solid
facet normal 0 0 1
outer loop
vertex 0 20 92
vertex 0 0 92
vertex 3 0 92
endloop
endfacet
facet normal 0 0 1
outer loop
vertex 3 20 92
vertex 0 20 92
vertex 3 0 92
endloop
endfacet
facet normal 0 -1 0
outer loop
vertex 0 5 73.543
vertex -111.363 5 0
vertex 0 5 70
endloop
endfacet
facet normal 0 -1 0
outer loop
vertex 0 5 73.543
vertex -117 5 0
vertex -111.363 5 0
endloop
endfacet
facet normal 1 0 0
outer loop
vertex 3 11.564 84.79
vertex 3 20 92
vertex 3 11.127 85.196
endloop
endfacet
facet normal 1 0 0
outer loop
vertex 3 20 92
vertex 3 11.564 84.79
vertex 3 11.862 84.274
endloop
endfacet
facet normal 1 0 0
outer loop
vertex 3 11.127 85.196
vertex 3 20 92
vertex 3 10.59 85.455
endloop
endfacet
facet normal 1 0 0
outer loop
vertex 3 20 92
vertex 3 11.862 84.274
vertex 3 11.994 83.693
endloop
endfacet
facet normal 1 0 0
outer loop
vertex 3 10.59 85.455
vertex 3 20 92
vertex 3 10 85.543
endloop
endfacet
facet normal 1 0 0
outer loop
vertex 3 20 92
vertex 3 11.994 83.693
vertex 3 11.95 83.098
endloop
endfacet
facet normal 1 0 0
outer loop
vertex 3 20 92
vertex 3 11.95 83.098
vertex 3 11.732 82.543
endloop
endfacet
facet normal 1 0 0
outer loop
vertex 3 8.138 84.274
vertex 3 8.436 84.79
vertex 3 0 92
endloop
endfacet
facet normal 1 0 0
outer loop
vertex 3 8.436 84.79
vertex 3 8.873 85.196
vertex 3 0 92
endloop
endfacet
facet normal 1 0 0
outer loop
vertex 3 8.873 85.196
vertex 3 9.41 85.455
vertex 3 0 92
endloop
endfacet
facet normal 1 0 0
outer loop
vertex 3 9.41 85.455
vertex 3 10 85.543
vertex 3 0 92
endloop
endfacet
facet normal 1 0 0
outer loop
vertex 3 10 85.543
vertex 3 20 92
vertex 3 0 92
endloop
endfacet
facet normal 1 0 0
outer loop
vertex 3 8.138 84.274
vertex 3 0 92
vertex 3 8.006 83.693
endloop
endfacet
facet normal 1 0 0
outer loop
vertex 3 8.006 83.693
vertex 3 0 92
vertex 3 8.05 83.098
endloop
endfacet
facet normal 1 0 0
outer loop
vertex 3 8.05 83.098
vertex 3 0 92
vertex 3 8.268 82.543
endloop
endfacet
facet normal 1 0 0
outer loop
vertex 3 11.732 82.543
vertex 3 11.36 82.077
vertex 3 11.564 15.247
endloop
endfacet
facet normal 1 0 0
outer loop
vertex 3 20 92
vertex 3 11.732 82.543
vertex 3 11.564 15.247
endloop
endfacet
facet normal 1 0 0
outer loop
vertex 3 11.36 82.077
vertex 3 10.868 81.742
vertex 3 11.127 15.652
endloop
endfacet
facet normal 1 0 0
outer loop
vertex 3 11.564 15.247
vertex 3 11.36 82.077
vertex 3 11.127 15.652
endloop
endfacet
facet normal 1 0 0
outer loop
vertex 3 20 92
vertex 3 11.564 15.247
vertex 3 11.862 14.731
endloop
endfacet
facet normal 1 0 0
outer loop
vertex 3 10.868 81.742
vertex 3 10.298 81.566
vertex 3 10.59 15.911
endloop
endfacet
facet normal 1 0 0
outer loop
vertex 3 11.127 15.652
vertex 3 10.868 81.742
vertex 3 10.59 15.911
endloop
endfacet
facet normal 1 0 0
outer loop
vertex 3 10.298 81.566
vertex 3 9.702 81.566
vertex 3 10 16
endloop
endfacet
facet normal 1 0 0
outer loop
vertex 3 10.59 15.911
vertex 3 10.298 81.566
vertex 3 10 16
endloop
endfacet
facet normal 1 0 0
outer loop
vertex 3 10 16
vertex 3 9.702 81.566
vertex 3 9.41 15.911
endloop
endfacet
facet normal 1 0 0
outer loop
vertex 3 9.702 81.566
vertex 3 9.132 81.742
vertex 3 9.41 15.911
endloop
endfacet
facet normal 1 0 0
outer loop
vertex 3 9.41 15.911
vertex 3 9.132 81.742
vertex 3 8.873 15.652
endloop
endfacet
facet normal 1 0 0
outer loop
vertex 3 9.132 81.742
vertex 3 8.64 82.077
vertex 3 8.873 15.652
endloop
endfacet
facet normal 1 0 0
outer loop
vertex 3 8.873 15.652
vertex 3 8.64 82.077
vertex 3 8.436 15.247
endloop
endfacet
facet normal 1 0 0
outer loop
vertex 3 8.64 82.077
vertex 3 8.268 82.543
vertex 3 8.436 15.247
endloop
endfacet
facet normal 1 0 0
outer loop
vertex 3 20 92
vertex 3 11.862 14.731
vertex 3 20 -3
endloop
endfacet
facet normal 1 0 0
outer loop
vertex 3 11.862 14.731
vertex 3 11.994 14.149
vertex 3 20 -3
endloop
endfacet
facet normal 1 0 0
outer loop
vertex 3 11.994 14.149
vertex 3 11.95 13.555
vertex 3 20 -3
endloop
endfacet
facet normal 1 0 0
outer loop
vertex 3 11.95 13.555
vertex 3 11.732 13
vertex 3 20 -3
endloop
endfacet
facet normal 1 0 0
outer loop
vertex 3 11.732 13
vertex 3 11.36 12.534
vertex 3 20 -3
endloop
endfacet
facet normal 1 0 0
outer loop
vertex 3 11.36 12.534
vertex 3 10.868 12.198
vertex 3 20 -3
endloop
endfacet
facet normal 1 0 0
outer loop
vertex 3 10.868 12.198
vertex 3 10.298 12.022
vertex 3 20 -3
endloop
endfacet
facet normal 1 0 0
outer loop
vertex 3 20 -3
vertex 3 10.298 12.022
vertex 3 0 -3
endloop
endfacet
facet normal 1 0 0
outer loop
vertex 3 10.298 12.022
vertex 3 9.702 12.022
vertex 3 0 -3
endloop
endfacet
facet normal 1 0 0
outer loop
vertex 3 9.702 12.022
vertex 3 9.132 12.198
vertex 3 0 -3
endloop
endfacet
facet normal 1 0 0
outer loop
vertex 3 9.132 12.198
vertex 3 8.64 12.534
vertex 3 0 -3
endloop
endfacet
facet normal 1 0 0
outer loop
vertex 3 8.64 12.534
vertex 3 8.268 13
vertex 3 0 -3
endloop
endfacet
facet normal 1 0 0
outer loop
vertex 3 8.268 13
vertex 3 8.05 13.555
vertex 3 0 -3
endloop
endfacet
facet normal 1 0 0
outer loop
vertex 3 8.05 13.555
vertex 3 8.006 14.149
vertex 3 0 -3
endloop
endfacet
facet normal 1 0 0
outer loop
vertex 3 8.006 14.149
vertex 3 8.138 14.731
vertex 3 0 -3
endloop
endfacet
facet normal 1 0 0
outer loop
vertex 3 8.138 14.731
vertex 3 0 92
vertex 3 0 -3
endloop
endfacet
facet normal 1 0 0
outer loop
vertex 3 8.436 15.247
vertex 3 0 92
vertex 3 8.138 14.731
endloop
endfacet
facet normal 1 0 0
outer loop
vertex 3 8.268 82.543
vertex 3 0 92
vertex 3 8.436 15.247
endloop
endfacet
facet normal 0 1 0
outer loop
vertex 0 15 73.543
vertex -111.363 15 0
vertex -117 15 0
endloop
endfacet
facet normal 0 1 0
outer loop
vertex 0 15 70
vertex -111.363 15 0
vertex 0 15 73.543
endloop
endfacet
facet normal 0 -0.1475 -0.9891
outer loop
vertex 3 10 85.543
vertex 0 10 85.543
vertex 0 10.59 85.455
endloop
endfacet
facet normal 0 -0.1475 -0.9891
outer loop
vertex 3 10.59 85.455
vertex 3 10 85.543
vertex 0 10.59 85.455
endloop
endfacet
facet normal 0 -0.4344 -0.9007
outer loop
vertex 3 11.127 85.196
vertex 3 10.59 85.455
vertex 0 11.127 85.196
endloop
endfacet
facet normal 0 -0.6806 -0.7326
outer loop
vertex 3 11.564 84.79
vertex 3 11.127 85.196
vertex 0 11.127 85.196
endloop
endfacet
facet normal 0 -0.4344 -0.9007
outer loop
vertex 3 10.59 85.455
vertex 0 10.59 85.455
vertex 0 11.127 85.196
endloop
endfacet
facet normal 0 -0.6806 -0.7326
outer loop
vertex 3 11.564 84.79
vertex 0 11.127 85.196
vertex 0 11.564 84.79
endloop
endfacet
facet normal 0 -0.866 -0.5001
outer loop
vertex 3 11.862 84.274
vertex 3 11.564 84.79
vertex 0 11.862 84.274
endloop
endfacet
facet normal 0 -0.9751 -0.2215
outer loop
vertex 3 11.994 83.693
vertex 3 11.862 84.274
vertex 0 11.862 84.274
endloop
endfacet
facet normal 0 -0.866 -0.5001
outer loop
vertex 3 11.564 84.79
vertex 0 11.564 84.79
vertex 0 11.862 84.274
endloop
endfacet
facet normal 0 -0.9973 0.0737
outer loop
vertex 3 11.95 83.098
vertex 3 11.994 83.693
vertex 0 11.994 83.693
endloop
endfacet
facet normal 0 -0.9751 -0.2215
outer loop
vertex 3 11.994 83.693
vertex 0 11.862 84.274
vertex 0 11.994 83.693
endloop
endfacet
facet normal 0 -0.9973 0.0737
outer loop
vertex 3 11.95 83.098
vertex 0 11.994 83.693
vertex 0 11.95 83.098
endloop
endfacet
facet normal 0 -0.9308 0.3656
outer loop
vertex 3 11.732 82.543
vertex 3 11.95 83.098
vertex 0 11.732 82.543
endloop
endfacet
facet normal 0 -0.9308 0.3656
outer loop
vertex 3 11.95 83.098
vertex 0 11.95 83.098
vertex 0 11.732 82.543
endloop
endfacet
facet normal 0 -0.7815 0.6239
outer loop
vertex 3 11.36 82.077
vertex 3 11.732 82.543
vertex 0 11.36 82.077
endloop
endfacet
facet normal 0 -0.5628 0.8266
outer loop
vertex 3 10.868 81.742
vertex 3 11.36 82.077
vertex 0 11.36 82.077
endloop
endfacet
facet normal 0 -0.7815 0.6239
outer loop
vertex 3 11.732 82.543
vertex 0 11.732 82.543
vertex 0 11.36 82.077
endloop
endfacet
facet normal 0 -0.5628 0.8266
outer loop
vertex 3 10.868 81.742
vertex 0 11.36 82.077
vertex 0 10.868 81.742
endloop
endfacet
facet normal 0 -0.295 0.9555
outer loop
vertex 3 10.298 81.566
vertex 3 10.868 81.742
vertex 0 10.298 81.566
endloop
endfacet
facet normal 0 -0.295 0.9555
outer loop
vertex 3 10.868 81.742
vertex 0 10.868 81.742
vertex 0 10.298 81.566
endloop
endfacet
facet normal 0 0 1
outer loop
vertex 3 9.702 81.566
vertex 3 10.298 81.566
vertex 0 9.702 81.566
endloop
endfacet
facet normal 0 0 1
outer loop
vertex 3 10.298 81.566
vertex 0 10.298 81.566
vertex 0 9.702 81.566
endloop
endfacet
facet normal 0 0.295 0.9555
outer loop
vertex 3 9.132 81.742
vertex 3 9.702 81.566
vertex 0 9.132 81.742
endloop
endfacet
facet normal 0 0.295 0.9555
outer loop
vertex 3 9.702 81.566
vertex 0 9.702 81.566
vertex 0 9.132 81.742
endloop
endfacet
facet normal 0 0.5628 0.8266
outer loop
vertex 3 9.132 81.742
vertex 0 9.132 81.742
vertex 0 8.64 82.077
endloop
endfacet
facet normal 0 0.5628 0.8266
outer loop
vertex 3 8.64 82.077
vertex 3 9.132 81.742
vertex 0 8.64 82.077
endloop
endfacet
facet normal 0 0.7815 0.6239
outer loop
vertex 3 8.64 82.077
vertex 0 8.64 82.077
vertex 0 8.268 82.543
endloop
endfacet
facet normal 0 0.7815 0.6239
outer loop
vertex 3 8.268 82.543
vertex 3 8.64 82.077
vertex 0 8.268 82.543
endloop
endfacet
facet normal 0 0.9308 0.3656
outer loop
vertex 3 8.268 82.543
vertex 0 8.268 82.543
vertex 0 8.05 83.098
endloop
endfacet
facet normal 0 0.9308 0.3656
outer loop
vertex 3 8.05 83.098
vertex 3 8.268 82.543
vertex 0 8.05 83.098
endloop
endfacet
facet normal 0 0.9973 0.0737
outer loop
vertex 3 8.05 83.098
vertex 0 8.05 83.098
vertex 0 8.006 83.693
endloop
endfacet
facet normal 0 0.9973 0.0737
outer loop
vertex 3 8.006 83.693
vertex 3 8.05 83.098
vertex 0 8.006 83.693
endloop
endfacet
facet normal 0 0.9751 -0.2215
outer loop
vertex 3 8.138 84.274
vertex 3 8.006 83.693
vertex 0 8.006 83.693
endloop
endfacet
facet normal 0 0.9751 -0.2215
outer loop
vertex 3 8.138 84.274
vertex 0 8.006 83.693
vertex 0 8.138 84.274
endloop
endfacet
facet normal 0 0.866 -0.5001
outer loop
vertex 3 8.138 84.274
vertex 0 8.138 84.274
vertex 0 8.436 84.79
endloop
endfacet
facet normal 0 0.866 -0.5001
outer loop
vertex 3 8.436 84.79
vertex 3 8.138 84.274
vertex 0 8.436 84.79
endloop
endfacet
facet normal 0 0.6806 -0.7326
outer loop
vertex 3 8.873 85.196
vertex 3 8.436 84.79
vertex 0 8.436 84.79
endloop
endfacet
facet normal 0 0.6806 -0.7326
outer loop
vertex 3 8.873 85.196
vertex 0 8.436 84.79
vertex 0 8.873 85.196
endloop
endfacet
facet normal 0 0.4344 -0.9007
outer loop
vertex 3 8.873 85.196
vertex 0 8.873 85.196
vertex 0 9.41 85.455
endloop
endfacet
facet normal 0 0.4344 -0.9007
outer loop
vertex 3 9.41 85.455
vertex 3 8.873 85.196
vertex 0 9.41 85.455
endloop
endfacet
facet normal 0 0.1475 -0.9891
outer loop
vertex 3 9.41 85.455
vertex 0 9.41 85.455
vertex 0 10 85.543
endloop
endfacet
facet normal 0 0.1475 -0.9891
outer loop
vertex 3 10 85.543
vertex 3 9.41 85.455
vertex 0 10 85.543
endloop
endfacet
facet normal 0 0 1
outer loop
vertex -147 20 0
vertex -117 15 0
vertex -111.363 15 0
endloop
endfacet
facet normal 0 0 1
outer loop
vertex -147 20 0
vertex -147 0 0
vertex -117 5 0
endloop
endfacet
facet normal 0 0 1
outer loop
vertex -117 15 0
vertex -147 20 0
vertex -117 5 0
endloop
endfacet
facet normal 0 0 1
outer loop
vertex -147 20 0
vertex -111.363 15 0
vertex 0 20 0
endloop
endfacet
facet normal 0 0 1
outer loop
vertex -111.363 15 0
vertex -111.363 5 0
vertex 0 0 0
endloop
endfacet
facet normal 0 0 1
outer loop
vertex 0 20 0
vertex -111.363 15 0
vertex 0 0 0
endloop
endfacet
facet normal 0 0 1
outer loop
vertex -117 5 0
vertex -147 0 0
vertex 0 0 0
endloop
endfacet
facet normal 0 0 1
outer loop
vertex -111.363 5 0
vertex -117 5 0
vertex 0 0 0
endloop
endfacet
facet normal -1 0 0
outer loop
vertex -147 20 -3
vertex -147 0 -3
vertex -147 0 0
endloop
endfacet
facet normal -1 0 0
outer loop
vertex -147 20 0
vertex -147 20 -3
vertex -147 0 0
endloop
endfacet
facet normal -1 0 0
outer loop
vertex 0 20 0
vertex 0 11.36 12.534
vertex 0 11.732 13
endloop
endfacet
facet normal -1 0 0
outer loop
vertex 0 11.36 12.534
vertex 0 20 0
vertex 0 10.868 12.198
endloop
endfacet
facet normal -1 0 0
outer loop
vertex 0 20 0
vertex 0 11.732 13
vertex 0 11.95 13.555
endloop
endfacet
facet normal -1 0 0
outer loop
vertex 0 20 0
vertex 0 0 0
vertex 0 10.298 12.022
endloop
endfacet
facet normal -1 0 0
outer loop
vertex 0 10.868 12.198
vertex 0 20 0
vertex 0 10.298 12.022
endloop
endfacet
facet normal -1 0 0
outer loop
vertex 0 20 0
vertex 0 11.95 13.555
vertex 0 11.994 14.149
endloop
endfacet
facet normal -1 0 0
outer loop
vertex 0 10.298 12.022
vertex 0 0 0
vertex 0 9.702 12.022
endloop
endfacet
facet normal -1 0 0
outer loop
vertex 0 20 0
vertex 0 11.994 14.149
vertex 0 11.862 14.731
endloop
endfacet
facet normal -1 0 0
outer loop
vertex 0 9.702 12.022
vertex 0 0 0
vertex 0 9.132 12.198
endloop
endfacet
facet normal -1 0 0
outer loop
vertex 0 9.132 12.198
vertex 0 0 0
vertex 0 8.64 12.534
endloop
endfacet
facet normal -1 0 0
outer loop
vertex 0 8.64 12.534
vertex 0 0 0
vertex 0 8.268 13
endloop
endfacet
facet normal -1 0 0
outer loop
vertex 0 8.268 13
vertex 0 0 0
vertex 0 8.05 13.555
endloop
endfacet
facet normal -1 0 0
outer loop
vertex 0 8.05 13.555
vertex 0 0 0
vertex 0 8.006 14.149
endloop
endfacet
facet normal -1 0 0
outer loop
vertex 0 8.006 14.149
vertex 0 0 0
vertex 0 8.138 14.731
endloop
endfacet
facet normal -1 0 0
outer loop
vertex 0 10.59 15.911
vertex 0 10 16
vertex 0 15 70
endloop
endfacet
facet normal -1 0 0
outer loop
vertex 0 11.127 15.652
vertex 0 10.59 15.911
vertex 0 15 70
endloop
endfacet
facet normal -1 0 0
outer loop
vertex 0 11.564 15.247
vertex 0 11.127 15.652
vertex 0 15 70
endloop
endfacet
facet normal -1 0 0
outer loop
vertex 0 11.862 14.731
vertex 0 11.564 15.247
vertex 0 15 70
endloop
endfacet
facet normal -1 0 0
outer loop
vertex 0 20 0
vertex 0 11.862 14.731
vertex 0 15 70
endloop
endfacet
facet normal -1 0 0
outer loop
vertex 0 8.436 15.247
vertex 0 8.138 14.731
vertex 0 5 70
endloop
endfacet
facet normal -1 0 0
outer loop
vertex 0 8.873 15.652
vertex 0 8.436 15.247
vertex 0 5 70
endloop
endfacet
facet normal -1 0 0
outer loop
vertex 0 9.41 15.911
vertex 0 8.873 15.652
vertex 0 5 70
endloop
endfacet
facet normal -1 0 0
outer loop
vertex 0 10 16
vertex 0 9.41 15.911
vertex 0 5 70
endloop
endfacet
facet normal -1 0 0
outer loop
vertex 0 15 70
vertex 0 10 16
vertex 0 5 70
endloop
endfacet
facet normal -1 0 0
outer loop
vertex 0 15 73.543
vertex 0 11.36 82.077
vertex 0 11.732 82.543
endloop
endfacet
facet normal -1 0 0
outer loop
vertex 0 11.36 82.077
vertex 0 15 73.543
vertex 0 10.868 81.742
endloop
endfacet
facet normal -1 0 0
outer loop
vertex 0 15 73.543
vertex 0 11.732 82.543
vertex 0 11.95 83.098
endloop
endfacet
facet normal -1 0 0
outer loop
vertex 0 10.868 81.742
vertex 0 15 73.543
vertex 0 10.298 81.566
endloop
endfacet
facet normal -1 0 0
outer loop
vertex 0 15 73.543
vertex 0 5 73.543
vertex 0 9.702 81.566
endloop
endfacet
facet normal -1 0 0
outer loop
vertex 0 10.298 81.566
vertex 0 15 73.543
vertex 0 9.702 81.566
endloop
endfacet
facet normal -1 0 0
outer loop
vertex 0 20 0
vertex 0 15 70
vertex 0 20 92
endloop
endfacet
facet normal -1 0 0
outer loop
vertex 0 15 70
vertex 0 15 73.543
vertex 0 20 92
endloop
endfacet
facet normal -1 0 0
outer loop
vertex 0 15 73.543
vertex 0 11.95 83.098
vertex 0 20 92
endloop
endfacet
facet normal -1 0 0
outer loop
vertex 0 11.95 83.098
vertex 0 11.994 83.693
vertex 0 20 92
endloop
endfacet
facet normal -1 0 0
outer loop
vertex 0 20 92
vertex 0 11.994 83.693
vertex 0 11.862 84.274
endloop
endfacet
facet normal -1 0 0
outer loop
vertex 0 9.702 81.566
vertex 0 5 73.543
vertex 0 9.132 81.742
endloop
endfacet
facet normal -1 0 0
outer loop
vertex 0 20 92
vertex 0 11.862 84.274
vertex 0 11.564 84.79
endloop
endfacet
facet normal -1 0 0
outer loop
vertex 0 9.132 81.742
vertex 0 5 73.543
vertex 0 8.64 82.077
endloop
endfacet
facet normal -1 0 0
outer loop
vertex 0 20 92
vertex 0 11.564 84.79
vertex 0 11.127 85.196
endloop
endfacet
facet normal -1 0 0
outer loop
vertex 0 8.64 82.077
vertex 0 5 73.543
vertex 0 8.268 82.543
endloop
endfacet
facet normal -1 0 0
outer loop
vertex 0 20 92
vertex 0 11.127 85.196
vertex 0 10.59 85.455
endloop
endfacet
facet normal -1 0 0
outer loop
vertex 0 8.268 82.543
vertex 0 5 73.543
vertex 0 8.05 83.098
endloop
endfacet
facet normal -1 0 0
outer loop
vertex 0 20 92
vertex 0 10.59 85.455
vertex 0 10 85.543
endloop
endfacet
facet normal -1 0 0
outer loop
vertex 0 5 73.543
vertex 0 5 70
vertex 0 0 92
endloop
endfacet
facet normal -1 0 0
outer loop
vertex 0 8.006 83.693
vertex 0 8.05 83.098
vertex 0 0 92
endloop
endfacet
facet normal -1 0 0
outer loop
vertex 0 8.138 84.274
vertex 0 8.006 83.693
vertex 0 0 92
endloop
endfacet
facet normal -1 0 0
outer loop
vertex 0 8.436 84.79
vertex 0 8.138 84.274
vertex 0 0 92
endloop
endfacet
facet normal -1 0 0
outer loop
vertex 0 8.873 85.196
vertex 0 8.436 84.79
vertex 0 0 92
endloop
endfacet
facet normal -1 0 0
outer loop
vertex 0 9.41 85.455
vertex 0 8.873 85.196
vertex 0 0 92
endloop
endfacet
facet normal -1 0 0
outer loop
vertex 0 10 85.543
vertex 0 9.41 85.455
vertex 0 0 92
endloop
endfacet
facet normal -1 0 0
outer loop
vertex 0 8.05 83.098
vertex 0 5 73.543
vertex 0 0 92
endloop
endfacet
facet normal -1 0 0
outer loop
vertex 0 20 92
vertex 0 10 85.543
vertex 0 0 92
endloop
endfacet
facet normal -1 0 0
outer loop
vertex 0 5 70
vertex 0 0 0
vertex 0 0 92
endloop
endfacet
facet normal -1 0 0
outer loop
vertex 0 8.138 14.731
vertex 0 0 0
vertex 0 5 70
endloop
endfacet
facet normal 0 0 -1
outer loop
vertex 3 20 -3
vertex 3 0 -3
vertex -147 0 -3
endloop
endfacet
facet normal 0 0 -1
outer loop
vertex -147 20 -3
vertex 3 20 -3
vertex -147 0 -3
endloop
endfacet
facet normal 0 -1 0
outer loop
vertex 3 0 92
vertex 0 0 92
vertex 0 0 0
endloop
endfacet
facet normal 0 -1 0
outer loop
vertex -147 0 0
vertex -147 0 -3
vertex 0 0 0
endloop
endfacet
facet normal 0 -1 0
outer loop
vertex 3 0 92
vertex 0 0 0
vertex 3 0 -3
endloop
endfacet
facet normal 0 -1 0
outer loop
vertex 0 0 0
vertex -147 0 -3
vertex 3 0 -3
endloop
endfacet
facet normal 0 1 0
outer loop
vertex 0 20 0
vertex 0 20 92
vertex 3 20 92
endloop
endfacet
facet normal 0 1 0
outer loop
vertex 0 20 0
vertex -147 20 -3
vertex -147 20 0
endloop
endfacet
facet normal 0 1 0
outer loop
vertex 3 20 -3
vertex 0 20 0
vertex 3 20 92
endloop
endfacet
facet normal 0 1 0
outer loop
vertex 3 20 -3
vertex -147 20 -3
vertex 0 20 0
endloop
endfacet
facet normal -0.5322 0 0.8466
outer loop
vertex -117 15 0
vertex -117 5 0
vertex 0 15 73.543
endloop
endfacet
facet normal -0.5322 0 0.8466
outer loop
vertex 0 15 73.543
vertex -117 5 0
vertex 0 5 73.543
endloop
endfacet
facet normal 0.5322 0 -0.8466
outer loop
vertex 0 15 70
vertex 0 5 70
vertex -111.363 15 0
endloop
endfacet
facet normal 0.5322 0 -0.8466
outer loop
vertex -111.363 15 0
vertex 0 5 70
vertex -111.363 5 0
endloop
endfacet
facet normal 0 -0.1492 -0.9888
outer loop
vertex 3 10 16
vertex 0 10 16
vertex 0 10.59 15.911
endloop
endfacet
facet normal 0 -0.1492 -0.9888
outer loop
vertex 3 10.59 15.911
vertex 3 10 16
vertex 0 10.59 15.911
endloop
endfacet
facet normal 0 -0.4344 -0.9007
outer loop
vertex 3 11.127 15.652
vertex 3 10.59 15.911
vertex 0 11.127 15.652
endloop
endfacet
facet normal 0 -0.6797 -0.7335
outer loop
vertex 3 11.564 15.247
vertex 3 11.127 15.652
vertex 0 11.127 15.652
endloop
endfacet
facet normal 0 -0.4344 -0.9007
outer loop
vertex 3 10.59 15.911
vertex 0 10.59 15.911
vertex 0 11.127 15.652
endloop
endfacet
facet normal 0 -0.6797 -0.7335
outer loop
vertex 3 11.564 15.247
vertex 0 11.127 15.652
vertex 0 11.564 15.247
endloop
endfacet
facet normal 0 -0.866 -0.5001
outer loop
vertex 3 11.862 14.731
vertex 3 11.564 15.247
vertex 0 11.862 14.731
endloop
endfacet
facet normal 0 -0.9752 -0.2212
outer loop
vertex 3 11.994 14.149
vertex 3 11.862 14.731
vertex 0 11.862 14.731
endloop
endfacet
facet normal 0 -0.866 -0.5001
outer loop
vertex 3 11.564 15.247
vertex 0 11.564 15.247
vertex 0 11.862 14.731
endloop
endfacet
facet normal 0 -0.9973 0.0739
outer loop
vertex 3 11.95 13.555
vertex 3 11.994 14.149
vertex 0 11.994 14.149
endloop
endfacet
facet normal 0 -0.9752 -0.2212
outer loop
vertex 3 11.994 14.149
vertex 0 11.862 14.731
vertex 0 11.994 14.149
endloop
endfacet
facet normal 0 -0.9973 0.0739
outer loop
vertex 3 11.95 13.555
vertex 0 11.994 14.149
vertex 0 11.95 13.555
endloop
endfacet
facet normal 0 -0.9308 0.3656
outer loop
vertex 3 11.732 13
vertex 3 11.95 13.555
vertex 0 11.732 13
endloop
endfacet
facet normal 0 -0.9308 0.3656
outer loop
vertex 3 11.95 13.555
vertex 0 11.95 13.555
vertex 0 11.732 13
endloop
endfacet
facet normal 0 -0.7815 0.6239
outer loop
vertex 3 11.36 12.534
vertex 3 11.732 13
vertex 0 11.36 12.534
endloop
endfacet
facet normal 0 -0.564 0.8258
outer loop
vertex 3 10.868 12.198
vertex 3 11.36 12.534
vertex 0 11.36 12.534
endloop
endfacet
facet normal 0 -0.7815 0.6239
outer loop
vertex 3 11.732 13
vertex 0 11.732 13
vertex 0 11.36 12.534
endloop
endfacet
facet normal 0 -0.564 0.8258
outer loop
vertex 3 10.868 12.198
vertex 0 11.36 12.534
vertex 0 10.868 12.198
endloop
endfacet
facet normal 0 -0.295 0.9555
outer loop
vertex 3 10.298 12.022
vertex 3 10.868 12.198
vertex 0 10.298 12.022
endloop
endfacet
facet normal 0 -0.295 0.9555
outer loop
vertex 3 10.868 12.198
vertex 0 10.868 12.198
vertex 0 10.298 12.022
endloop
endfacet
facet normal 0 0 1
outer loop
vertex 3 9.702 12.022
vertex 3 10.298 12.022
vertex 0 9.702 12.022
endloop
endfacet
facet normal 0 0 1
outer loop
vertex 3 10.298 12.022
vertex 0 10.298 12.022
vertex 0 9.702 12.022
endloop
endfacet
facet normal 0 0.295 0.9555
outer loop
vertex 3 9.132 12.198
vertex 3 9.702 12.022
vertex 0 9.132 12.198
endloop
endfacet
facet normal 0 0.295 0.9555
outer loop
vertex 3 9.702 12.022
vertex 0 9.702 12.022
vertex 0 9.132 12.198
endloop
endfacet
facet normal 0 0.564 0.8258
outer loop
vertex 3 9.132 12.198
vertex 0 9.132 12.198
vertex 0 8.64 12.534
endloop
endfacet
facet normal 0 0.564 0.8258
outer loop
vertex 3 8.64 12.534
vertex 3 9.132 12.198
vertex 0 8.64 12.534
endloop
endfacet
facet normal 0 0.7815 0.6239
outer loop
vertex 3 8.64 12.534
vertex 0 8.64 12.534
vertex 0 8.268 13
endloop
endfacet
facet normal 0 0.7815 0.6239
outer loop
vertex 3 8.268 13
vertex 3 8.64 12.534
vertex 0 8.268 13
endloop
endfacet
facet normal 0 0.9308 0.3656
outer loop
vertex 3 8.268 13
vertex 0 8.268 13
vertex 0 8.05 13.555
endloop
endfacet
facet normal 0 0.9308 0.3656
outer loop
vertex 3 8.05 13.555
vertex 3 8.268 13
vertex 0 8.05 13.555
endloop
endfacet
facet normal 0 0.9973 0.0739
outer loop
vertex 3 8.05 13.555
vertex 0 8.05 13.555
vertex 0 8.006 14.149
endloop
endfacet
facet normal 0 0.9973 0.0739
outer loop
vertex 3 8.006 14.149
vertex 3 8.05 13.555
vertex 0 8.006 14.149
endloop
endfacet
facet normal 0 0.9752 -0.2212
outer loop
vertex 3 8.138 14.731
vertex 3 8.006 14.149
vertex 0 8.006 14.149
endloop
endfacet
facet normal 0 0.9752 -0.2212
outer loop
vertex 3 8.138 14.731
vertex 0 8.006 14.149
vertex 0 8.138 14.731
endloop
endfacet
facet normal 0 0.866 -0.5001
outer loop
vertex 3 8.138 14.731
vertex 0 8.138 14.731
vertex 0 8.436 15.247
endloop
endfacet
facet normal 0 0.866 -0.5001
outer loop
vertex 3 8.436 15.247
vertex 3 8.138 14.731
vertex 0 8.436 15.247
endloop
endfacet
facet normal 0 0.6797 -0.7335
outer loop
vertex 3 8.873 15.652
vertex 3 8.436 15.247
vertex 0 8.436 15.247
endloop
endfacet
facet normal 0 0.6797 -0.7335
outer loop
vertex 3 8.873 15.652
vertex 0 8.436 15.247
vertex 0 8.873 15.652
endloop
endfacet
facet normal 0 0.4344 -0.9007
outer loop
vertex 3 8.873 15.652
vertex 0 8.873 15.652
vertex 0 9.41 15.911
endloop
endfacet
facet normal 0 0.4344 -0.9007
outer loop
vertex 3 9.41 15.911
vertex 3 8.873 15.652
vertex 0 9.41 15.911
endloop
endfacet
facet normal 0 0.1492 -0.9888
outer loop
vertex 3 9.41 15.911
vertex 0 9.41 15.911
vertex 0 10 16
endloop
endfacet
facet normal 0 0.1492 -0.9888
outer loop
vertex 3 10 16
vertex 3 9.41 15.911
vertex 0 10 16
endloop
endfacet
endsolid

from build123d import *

# Parameters (mm, degrees)
SALIENTE_EXTRUIR1_DEPTH = 20
CROQUIS2_R              = 2
CORTAR_EXTRUIR1_DEPTH   = 20
CORTAR_EXTRUIR2_DEPTH   = 5
CORTAR_EXTRUIR3_DEPTH   = 5


with BuildPart() as part:
    # Croquis1 → Saliente-Extruir1 (new body)
    with BuildSketch(Plane(origin=(0, 0, 0), x_dir=(1, 0, 0), z_dir=(0, 1, 0))):
        Polygon((3, -92), (3, 3), (-147, 3), (-147, 0), (0, 0), (0, -92), align=None)
        Polygon((-111.362752101, 0), (-117, 0), (0, -73.543441101), (0, -70), align=None)
    extrude(amount=SALIENTE_EXTRUIR1_DEPTH)

    # Croquis2 → Cortar-Extruir1 (cut)
    with BuildSketch(Plane.ZY):
        with Locations((83.543441101, 10)):
            Circle(CROQUIS2_R)
        with Locations((14, 10)):
            Circle(CROQUIS2_R)
    extrude(amount=-CORTAR_EXTRUIR1_DEPTH, mode=Mode.SUBTRACT)

    # Croquis3 → Cortar-Extruir2 (cut)
    with BuildSketch(Plane.XZ):
        Polygon((0, 70), (0, 73.543441101), (-117, 0), (-111.362752101, 0), align=None)
    extrude(amount=-CORTAR_EXTRUIR2_DEPTH, mode=Mode.SUBTRACT)

    # Croquis4 → Cortar-Extruir3 (cut)
    with BuildSketch(Plane(origin=(0, 20, 0), x_dir=(1, 0, 0), z_dir=(0, 1, 0))):
        Polygon((0, -73.543441101), (0, -70), (-111.362752101, 0), (-117, 0), align=None)
    extrude(amount=-CORTAR_EXTRUIR3_DEPTH, mode=Mode.SUBTRACT)


solid = part.part
